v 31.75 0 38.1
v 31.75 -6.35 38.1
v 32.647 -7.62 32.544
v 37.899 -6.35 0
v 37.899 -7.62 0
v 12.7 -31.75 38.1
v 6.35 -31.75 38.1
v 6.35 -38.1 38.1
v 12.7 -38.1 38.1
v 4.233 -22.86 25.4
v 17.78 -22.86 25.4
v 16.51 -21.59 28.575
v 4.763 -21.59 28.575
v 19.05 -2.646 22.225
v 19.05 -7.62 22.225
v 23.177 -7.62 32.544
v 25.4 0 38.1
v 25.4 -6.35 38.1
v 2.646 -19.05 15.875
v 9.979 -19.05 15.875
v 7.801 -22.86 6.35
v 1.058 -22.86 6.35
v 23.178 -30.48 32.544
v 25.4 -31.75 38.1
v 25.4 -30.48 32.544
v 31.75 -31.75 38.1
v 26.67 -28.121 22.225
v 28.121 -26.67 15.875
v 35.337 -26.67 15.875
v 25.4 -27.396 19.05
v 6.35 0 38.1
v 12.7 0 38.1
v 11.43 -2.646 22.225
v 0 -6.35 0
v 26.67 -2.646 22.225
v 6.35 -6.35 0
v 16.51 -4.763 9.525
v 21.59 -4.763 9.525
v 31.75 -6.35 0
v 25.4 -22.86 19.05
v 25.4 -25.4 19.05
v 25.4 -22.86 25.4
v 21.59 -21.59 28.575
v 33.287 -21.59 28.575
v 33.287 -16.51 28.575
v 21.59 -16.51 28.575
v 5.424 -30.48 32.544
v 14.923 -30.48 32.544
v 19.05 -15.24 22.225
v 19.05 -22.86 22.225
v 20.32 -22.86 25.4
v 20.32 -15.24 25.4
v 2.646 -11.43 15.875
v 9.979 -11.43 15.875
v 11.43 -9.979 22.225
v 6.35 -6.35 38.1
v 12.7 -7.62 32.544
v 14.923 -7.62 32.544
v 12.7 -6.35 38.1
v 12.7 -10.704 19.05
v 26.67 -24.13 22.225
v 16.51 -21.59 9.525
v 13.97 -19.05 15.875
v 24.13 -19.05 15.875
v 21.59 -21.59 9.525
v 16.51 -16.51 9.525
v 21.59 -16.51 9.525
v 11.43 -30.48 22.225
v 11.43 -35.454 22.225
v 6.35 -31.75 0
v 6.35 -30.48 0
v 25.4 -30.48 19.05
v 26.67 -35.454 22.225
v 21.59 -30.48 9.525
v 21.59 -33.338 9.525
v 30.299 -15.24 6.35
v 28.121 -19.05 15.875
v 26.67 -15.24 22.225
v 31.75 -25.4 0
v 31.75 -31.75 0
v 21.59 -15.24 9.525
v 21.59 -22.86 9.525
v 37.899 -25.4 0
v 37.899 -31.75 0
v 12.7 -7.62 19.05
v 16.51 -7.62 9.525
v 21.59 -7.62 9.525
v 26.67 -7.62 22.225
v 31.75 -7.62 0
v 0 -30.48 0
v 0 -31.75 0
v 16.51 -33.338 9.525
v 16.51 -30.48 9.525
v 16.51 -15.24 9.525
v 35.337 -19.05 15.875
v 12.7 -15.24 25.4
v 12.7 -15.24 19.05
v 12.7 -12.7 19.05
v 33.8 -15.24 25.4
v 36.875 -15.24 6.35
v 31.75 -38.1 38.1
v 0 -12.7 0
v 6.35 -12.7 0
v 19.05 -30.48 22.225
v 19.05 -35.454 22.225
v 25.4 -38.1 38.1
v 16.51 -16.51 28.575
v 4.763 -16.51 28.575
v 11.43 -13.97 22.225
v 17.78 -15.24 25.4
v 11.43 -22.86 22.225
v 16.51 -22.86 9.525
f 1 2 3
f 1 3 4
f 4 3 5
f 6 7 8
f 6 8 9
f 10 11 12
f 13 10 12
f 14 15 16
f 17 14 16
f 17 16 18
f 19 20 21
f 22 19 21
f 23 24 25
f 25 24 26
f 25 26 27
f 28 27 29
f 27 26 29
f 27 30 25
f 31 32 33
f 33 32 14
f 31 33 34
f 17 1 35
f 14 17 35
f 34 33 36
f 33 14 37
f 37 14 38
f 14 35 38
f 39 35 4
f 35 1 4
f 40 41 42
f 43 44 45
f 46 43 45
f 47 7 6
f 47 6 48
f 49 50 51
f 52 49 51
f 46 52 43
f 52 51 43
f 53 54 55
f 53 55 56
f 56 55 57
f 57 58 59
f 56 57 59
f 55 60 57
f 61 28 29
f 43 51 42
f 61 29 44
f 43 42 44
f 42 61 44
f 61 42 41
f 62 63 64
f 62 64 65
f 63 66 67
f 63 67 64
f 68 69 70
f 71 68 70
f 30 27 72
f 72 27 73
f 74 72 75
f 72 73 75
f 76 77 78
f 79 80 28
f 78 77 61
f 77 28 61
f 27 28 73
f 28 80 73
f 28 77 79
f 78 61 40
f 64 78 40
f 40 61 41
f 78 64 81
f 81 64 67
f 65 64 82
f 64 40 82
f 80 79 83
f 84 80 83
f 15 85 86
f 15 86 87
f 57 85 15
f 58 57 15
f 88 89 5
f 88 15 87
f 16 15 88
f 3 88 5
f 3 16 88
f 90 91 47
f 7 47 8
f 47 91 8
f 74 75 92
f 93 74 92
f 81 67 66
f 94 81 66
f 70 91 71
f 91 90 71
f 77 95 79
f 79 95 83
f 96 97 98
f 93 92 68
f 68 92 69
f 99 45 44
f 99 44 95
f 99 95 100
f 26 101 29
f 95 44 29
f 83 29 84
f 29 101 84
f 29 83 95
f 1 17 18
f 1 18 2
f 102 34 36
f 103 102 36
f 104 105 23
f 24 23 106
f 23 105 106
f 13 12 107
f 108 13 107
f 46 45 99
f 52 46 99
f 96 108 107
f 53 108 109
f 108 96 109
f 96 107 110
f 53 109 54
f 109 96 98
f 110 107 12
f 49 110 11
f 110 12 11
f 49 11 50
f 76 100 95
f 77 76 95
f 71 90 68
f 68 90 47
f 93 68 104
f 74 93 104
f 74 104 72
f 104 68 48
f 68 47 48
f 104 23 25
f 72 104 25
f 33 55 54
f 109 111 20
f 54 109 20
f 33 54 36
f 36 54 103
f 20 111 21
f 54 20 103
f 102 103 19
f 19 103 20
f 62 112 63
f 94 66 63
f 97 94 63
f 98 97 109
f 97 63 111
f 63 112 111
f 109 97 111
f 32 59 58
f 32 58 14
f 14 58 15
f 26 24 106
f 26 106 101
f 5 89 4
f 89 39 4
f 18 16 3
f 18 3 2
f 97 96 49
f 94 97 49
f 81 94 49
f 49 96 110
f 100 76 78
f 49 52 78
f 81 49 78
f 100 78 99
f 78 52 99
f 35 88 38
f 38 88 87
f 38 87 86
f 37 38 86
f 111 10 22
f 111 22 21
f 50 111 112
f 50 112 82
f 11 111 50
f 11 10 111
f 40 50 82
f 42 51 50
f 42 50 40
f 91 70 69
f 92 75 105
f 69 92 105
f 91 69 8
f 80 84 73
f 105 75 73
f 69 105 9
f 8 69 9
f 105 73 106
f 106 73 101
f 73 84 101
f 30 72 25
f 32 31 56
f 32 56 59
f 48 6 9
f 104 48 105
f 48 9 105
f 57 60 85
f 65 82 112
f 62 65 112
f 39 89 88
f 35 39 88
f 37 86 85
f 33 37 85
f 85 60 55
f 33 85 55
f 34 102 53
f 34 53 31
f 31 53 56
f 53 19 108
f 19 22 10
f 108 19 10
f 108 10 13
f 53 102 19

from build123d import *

# Parameters (mm, degrees)
F0_W     = 38.1
F0_H     = 38.1
F1_DEPTH = 38.1
F5_DEPTH = 38.1
F7_DEPTH = 38.1
F8_W     = 25.4
F8_H     = 7.62
F9_DEPTH = 38.1


with BuildPart() as f1:
    # F0 (on Front) → F1 (new body)
    with BuildSketch(Plane.XZ):
        with Locations((19.05, 19.05)):
            Rectangle(F0_W, F0_H)
    extrude(amount=F1_DEPTH)

    # F4 (on face) → F5 (cut)
    with BuildSketch(Plane.YZ.offset(38.1)):
        Polygon((-6.35, 38.1), (-31.75, 38.1), (-26.67, 15.875), (-21.59, 28.575), (-16.51, 28.575), (-11.43, 15.875), align=None)
        Polygon((-31.75, 0), (-38.1, 38.1), (-38.1, 0), align=None)
        Polygon((-19.05, 15.875), (-25.4, 0), (-12.7, 0), align=None)
        Polygon((0, 0), (0, 38.1), (-6.35, 0), align=None)
    extrude(amount=-F5_DEPTH, mode=Mode.SUBTRACT)

    # F6 (on offset) → F7 (cut)
    with BuildSketch(Plane.XZ.offset(38.1)):
        Polygon((0, 0), (6.35, 38.1), (0, 38.1), align=None)
        Polygon((25.4, 38.1), (12.7, 38.1), (19.05, 22.225), align=None)
        Polygon((11.43, 22.225), (6.35, 0), (31.75, 0), (26.67, 22.225), (21.59, 9.525), (16.51, 9.525), align=None)
        Polygon((38.1, 38.1), (31.75, 38.1), (37.899472, 0), (38.1, 0), align=None)
    extrude(amount=-F7_DEPTH, mode=Mode.SUBTRACT)

    # F8 (on offset) → F9 (cut)
    with BuildSketch(Plane.XY.offset(38.1)):
        with Locations((25.4, -11.43)):
            Rectangle(F8_W, F8_H)
        with Locations((12.7, -26.67)):
            Rectangle(F8_W, F8_H)
    extrude(amount=-F9_DEPTH, mode=Mode.SUBTRACT)


solid = f1.part
